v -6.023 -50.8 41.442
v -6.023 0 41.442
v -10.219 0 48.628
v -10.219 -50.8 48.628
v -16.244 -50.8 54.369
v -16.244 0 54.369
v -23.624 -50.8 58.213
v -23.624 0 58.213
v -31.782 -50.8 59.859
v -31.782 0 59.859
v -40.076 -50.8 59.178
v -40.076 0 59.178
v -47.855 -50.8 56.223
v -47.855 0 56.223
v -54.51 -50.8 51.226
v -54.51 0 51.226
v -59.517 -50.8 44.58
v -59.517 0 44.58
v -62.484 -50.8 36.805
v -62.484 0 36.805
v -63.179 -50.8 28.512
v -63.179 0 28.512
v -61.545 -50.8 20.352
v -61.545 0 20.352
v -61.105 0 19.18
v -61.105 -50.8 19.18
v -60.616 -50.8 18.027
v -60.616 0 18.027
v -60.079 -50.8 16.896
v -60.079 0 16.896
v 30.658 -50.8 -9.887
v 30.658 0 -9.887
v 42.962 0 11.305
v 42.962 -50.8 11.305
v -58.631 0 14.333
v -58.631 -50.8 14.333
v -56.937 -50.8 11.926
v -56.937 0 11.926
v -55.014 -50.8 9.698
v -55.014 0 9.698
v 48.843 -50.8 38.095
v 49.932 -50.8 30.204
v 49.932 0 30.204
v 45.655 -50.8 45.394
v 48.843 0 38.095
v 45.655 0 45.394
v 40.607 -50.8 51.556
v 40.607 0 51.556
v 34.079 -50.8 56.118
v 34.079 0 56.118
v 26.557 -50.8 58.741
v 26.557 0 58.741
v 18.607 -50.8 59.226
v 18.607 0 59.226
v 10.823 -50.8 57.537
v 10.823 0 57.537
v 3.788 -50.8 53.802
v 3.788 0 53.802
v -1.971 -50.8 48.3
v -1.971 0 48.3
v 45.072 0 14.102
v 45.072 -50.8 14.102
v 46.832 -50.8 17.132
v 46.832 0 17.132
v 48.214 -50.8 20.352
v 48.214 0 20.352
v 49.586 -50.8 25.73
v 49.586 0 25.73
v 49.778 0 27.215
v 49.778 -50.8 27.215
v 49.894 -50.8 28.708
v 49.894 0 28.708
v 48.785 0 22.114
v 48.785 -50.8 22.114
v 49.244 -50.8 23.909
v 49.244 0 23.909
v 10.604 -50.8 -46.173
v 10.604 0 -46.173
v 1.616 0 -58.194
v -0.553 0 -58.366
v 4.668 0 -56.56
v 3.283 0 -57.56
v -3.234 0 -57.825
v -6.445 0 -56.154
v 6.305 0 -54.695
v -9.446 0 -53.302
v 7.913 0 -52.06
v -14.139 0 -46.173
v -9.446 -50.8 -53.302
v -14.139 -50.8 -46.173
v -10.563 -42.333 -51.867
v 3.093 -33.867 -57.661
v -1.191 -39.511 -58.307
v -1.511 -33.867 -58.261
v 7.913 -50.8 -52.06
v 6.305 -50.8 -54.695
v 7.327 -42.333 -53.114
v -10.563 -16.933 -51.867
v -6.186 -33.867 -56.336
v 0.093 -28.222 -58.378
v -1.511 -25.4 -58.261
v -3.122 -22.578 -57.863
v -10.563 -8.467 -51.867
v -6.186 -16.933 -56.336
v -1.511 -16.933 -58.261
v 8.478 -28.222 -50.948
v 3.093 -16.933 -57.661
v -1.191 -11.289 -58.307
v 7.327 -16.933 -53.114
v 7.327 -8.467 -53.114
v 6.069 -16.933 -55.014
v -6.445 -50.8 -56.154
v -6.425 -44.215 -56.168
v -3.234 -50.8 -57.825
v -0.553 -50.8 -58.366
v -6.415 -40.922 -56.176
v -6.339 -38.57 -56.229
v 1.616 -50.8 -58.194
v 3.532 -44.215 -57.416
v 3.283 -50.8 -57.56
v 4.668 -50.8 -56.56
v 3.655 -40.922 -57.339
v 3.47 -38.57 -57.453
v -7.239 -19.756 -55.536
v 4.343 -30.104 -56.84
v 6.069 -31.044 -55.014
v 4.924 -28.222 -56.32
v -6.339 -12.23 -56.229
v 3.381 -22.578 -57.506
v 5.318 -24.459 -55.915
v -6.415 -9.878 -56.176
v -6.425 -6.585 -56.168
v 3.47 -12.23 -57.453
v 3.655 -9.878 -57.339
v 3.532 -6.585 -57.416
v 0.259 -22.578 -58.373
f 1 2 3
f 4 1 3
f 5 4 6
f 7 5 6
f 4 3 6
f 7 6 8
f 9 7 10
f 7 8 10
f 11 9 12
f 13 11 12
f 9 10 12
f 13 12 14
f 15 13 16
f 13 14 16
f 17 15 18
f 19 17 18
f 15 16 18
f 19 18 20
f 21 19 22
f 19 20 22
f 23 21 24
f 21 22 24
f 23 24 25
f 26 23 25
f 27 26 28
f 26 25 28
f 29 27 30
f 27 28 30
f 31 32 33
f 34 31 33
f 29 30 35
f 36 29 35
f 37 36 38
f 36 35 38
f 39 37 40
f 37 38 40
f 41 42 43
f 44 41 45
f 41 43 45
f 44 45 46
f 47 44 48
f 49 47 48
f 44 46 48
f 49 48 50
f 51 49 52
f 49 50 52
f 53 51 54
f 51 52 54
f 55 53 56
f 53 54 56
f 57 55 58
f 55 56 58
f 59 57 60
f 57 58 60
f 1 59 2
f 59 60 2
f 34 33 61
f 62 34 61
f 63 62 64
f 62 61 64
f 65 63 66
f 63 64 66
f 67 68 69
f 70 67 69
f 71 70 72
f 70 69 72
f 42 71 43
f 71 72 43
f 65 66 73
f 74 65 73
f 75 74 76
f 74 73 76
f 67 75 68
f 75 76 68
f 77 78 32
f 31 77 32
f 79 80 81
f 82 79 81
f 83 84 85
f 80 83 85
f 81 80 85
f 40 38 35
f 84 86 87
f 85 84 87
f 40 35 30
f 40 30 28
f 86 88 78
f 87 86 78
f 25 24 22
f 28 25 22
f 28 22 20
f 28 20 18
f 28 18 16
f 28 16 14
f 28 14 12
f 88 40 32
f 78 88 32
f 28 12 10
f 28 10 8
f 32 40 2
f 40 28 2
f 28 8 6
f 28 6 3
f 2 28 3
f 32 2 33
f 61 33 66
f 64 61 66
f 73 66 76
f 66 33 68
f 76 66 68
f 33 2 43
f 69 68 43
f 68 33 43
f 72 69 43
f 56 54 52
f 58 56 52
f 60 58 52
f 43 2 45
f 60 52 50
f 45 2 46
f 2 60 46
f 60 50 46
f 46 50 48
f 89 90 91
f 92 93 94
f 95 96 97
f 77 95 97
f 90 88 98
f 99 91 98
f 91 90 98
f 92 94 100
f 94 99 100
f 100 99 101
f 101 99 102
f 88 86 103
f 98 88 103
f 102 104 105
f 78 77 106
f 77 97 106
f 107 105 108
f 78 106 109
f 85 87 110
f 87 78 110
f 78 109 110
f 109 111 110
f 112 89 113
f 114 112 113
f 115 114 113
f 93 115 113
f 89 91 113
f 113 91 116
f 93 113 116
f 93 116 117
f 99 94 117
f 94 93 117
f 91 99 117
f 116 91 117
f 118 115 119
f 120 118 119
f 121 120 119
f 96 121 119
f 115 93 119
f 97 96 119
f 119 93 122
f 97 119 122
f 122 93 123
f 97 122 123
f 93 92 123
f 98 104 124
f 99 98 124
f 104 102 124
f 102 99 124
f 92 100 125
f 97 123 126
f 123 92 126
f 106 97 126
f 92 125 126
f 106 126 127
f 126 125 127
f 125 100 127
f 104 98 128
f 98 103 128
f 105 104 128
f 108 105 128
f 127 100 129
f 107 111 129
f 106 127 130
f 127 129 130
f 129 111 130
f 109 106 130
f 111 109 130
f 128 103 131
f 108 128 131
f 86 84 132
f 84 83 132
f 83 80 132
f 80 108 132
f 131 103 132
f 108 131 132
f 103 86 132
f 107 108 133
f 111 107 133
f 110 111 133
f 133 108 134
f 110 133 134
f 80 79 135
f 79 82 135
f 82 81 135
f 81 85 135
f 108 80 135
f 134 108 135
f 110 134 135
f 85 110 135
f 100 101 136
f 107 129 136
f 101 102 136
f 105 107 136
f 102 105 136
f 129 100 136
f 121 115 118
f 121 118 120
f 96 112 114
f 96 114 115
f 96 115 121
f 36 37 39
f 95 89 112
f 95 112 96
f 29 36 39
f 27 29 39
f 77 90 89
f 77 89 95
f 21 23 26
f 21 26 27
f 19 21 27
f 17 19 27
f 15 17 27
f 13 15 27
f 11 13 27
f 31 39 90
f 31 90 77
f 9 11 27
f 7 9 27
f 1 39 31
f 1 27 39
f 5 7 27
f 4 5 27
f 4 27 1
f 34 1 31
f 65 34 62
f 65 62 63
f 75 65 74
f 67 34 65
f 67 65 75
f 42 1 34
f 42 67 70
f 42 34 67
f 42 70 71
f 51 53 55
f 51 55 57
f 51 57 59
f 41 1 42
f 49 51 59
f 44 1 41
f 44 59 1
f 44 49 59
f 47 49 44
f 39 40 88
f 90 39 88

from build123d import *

# Parameters (mm, degrees)
F1_DEPTH = 50.8


with BuildPart() as f1:
    # F0 (on Front) → F1 (new body)
    with BuildSketch(Plane.XZ):
        with BuildLine():
            Line((-51.3954042884, 6.4779423518), (-61.5453907135, 20.3519611838))
            ThreePointArc((-61.5453907135, 20.3519611838), (-60.8667138024, 18.6005583406), (-60.0787079167, 16.8955477856))
            Line((-60.0787079167, 16.8955477856), (-54.2455671219, 8.922226261))
            ThreePointArc((-54.2455671219, 8.922226261), (-52.8591429812, 7.6550079014), (-51.3954042884, 6.4779423518))
        make_face()
        with BuildLine():
            ThreePointArc((-6.0226364292, 41.4420108727), (-44.0692352638, 57.9743919714), (-61.5453907135, 20.3519611838))
            Line((-61.5453907135, 20.3519611838), (-51.3954042884, 6.4779423518))
            ThreePointArc((-51.3954042884, 6.4779423518), (-25.6375926651, 1.5636092662), (-6.0226364292, 18.9667417762))
            ThreePointArc((-6.0226364292, 18.9667417762), (-8.2795262845, 30.2043763245), (-6.0226364292, 41.4420108727))
        make_face()
        with BuildLine():
            Line((-54.2455671219, 8.922226261), (-60.0787079167, 16.8955477856))
            ThreePointArc((-60.0787079167, 16.8955477856), (-57.8142370593, 13.1083030608), (-55.0137343474, 9.6982832032))
            ThreePointArc((-55.0137343474, 9.6982832032), (-54.6332168762, 9.3067248454), (-54.2455671219, 8.922226261))
        make_face()
        with BuildLine():
            ThreePointArc((49.9324337511, 30.2043763245), (26.557465469, 58.7405564697), (-6.0226364292, 41.4420108727))
            ThreePointArc((-6.0226364292, 41.4420108727), (-4.3721548681, 35.9305871783), (-3.8150285088, 30.2043763245))
            ThreePointArc((-3.8150285088, 30.2043763245), (-4.3721548681, 24.4781654706), (-6.0226364292, 18.9667417762))
            ThreePointArc((-6.0226364292, 18.9667417762), (14.6704111622, 1.7568595144), (40.6273265146, 8.8716899044))
            Line((40.6273265146, 8.8716899044), (49.5864414711, 25.7298732103))
            ThreePointArc((49.5864414711, 25.7298732103), (49.8458067689, 27.9604462466), (49.9324337511, 30.2043763245))
        make_face()
        with BuildLine():
            ThreePointArc((-3.8150285088, 30.2043763245), (-4.3721548681, 35.9305871783), (-6.0226364292, 41.4420108727))
            ThreePointArc((-6.0226364292, 41.4420108727), (-8.2795262845, 30.2043763245), (-6.0226364292, 18.9667417762))
            ThreePointArc((-6.0226364292, 18.9667417762), (-4.3721548681, 24.4781654706), (-3.8150285088, 30.2043763245))
        make_face()
        with BuildLine():
            ThreePointArc((-6.0226364292, 18.9667417762), (-25.6375926651, 1.5636092662), (-51.3954042884, 6.4779423518))
            ThreePointArc((-51.3954042884, 6.4779423518), (-52.8591429812, 7.6550079014), (-54.2455671219, 8.922226261))
            ThreePointArc((-54.2455671219, 8.922226261), (-54.6332168762, 9.3067248454), (-55.0137343474, 9.6982832032))
            Line((-55.0137343474, 9.6982832032), (-14.1391605139, -46.1731813848))
            add(Edge.make_bspline(
                [(-14.1391605139, -46.1731813848), (-11.8439830731, -50.1050845186), (-7.5927454261, -57.3879439304), (4.7284603427, -60.0028426907), (8.5254006183, -51.0662741363), (10.6043620035, -46.1731813848)],
                knots=[0, 0, 0, 0, 0.3467922767, 0.6423452742, 1, 1, 1, 1], degree=3))
            Line((10.6043620035, -46.1731813848), (30.6583169634, -9.8867913974))
            Line((30.6583169634, -9.8867913974), (40.6273265146, 8.8716899044))
            ThreePointArc((40.6273265146, 8.8716899044), (14.6704111622, 1.7568595144), (-6.0226364292, 18.9667417762))
        make_face()
        with BuildLine():
            ThreePointArc((48.2141880079, 20.3519611838), (49.0287968317, 23.0081330988), (49.5864414711, 25.7298732103))
            Line((49.5864414711, 25.7298732103), (40.6273265146, 8.8716899044))
            ThreePointArc((40.6273265146, 8.8716899044), (41.0589651736, 9.2806206), (41.4821603951, 9.6982832032))
            ThreePointArc((41.4821603951, 9.6982832032), (42.2370183544, 10.4877387966), (42.9617238671, 11.3049612832))
            Line((42.9617238671, 11.3049612832), (48.2141880079, 20.3519611838))
        make_face()
        with BuildLine():
            ThreePointArc((41.4821603951, 9.6982832032), (41.0589651736, 9.2806206), (40.6273265146, 8.8716899044))
            Line((40.6273265146, 8.8716899044), (30.6583169634, -9.8867913974))
            Line((30.6583169634, -9.8867913974), (41.4821603951, 9.6982832032))
        make_face()
        with BuildLine():
            ThreePointArc((42.9617238671, 11.3049612832), (45.9977477646, 15.590546245), (48.2141880079, 20.3519611838))
            Line((48.2141880079, 20.3519611838), (42.9617238671, 11.3049612832))
        make_face()
        with BuildLine():
            ThreePointArc((42.9617238671, 11.3049612832), (42.2370183544, 10.4877387966), (41.4821603951, 9.6982832032))
            Line((41.4821603951, 9.6982832032), (30.6583169634, -9.8867913974))
            Line((30.6583169634, -9.8867913974), (42.9617238671, 11.3049612832))
        make_face()
    extrude(amount=F1_DEPTH)


solid = f1.part
